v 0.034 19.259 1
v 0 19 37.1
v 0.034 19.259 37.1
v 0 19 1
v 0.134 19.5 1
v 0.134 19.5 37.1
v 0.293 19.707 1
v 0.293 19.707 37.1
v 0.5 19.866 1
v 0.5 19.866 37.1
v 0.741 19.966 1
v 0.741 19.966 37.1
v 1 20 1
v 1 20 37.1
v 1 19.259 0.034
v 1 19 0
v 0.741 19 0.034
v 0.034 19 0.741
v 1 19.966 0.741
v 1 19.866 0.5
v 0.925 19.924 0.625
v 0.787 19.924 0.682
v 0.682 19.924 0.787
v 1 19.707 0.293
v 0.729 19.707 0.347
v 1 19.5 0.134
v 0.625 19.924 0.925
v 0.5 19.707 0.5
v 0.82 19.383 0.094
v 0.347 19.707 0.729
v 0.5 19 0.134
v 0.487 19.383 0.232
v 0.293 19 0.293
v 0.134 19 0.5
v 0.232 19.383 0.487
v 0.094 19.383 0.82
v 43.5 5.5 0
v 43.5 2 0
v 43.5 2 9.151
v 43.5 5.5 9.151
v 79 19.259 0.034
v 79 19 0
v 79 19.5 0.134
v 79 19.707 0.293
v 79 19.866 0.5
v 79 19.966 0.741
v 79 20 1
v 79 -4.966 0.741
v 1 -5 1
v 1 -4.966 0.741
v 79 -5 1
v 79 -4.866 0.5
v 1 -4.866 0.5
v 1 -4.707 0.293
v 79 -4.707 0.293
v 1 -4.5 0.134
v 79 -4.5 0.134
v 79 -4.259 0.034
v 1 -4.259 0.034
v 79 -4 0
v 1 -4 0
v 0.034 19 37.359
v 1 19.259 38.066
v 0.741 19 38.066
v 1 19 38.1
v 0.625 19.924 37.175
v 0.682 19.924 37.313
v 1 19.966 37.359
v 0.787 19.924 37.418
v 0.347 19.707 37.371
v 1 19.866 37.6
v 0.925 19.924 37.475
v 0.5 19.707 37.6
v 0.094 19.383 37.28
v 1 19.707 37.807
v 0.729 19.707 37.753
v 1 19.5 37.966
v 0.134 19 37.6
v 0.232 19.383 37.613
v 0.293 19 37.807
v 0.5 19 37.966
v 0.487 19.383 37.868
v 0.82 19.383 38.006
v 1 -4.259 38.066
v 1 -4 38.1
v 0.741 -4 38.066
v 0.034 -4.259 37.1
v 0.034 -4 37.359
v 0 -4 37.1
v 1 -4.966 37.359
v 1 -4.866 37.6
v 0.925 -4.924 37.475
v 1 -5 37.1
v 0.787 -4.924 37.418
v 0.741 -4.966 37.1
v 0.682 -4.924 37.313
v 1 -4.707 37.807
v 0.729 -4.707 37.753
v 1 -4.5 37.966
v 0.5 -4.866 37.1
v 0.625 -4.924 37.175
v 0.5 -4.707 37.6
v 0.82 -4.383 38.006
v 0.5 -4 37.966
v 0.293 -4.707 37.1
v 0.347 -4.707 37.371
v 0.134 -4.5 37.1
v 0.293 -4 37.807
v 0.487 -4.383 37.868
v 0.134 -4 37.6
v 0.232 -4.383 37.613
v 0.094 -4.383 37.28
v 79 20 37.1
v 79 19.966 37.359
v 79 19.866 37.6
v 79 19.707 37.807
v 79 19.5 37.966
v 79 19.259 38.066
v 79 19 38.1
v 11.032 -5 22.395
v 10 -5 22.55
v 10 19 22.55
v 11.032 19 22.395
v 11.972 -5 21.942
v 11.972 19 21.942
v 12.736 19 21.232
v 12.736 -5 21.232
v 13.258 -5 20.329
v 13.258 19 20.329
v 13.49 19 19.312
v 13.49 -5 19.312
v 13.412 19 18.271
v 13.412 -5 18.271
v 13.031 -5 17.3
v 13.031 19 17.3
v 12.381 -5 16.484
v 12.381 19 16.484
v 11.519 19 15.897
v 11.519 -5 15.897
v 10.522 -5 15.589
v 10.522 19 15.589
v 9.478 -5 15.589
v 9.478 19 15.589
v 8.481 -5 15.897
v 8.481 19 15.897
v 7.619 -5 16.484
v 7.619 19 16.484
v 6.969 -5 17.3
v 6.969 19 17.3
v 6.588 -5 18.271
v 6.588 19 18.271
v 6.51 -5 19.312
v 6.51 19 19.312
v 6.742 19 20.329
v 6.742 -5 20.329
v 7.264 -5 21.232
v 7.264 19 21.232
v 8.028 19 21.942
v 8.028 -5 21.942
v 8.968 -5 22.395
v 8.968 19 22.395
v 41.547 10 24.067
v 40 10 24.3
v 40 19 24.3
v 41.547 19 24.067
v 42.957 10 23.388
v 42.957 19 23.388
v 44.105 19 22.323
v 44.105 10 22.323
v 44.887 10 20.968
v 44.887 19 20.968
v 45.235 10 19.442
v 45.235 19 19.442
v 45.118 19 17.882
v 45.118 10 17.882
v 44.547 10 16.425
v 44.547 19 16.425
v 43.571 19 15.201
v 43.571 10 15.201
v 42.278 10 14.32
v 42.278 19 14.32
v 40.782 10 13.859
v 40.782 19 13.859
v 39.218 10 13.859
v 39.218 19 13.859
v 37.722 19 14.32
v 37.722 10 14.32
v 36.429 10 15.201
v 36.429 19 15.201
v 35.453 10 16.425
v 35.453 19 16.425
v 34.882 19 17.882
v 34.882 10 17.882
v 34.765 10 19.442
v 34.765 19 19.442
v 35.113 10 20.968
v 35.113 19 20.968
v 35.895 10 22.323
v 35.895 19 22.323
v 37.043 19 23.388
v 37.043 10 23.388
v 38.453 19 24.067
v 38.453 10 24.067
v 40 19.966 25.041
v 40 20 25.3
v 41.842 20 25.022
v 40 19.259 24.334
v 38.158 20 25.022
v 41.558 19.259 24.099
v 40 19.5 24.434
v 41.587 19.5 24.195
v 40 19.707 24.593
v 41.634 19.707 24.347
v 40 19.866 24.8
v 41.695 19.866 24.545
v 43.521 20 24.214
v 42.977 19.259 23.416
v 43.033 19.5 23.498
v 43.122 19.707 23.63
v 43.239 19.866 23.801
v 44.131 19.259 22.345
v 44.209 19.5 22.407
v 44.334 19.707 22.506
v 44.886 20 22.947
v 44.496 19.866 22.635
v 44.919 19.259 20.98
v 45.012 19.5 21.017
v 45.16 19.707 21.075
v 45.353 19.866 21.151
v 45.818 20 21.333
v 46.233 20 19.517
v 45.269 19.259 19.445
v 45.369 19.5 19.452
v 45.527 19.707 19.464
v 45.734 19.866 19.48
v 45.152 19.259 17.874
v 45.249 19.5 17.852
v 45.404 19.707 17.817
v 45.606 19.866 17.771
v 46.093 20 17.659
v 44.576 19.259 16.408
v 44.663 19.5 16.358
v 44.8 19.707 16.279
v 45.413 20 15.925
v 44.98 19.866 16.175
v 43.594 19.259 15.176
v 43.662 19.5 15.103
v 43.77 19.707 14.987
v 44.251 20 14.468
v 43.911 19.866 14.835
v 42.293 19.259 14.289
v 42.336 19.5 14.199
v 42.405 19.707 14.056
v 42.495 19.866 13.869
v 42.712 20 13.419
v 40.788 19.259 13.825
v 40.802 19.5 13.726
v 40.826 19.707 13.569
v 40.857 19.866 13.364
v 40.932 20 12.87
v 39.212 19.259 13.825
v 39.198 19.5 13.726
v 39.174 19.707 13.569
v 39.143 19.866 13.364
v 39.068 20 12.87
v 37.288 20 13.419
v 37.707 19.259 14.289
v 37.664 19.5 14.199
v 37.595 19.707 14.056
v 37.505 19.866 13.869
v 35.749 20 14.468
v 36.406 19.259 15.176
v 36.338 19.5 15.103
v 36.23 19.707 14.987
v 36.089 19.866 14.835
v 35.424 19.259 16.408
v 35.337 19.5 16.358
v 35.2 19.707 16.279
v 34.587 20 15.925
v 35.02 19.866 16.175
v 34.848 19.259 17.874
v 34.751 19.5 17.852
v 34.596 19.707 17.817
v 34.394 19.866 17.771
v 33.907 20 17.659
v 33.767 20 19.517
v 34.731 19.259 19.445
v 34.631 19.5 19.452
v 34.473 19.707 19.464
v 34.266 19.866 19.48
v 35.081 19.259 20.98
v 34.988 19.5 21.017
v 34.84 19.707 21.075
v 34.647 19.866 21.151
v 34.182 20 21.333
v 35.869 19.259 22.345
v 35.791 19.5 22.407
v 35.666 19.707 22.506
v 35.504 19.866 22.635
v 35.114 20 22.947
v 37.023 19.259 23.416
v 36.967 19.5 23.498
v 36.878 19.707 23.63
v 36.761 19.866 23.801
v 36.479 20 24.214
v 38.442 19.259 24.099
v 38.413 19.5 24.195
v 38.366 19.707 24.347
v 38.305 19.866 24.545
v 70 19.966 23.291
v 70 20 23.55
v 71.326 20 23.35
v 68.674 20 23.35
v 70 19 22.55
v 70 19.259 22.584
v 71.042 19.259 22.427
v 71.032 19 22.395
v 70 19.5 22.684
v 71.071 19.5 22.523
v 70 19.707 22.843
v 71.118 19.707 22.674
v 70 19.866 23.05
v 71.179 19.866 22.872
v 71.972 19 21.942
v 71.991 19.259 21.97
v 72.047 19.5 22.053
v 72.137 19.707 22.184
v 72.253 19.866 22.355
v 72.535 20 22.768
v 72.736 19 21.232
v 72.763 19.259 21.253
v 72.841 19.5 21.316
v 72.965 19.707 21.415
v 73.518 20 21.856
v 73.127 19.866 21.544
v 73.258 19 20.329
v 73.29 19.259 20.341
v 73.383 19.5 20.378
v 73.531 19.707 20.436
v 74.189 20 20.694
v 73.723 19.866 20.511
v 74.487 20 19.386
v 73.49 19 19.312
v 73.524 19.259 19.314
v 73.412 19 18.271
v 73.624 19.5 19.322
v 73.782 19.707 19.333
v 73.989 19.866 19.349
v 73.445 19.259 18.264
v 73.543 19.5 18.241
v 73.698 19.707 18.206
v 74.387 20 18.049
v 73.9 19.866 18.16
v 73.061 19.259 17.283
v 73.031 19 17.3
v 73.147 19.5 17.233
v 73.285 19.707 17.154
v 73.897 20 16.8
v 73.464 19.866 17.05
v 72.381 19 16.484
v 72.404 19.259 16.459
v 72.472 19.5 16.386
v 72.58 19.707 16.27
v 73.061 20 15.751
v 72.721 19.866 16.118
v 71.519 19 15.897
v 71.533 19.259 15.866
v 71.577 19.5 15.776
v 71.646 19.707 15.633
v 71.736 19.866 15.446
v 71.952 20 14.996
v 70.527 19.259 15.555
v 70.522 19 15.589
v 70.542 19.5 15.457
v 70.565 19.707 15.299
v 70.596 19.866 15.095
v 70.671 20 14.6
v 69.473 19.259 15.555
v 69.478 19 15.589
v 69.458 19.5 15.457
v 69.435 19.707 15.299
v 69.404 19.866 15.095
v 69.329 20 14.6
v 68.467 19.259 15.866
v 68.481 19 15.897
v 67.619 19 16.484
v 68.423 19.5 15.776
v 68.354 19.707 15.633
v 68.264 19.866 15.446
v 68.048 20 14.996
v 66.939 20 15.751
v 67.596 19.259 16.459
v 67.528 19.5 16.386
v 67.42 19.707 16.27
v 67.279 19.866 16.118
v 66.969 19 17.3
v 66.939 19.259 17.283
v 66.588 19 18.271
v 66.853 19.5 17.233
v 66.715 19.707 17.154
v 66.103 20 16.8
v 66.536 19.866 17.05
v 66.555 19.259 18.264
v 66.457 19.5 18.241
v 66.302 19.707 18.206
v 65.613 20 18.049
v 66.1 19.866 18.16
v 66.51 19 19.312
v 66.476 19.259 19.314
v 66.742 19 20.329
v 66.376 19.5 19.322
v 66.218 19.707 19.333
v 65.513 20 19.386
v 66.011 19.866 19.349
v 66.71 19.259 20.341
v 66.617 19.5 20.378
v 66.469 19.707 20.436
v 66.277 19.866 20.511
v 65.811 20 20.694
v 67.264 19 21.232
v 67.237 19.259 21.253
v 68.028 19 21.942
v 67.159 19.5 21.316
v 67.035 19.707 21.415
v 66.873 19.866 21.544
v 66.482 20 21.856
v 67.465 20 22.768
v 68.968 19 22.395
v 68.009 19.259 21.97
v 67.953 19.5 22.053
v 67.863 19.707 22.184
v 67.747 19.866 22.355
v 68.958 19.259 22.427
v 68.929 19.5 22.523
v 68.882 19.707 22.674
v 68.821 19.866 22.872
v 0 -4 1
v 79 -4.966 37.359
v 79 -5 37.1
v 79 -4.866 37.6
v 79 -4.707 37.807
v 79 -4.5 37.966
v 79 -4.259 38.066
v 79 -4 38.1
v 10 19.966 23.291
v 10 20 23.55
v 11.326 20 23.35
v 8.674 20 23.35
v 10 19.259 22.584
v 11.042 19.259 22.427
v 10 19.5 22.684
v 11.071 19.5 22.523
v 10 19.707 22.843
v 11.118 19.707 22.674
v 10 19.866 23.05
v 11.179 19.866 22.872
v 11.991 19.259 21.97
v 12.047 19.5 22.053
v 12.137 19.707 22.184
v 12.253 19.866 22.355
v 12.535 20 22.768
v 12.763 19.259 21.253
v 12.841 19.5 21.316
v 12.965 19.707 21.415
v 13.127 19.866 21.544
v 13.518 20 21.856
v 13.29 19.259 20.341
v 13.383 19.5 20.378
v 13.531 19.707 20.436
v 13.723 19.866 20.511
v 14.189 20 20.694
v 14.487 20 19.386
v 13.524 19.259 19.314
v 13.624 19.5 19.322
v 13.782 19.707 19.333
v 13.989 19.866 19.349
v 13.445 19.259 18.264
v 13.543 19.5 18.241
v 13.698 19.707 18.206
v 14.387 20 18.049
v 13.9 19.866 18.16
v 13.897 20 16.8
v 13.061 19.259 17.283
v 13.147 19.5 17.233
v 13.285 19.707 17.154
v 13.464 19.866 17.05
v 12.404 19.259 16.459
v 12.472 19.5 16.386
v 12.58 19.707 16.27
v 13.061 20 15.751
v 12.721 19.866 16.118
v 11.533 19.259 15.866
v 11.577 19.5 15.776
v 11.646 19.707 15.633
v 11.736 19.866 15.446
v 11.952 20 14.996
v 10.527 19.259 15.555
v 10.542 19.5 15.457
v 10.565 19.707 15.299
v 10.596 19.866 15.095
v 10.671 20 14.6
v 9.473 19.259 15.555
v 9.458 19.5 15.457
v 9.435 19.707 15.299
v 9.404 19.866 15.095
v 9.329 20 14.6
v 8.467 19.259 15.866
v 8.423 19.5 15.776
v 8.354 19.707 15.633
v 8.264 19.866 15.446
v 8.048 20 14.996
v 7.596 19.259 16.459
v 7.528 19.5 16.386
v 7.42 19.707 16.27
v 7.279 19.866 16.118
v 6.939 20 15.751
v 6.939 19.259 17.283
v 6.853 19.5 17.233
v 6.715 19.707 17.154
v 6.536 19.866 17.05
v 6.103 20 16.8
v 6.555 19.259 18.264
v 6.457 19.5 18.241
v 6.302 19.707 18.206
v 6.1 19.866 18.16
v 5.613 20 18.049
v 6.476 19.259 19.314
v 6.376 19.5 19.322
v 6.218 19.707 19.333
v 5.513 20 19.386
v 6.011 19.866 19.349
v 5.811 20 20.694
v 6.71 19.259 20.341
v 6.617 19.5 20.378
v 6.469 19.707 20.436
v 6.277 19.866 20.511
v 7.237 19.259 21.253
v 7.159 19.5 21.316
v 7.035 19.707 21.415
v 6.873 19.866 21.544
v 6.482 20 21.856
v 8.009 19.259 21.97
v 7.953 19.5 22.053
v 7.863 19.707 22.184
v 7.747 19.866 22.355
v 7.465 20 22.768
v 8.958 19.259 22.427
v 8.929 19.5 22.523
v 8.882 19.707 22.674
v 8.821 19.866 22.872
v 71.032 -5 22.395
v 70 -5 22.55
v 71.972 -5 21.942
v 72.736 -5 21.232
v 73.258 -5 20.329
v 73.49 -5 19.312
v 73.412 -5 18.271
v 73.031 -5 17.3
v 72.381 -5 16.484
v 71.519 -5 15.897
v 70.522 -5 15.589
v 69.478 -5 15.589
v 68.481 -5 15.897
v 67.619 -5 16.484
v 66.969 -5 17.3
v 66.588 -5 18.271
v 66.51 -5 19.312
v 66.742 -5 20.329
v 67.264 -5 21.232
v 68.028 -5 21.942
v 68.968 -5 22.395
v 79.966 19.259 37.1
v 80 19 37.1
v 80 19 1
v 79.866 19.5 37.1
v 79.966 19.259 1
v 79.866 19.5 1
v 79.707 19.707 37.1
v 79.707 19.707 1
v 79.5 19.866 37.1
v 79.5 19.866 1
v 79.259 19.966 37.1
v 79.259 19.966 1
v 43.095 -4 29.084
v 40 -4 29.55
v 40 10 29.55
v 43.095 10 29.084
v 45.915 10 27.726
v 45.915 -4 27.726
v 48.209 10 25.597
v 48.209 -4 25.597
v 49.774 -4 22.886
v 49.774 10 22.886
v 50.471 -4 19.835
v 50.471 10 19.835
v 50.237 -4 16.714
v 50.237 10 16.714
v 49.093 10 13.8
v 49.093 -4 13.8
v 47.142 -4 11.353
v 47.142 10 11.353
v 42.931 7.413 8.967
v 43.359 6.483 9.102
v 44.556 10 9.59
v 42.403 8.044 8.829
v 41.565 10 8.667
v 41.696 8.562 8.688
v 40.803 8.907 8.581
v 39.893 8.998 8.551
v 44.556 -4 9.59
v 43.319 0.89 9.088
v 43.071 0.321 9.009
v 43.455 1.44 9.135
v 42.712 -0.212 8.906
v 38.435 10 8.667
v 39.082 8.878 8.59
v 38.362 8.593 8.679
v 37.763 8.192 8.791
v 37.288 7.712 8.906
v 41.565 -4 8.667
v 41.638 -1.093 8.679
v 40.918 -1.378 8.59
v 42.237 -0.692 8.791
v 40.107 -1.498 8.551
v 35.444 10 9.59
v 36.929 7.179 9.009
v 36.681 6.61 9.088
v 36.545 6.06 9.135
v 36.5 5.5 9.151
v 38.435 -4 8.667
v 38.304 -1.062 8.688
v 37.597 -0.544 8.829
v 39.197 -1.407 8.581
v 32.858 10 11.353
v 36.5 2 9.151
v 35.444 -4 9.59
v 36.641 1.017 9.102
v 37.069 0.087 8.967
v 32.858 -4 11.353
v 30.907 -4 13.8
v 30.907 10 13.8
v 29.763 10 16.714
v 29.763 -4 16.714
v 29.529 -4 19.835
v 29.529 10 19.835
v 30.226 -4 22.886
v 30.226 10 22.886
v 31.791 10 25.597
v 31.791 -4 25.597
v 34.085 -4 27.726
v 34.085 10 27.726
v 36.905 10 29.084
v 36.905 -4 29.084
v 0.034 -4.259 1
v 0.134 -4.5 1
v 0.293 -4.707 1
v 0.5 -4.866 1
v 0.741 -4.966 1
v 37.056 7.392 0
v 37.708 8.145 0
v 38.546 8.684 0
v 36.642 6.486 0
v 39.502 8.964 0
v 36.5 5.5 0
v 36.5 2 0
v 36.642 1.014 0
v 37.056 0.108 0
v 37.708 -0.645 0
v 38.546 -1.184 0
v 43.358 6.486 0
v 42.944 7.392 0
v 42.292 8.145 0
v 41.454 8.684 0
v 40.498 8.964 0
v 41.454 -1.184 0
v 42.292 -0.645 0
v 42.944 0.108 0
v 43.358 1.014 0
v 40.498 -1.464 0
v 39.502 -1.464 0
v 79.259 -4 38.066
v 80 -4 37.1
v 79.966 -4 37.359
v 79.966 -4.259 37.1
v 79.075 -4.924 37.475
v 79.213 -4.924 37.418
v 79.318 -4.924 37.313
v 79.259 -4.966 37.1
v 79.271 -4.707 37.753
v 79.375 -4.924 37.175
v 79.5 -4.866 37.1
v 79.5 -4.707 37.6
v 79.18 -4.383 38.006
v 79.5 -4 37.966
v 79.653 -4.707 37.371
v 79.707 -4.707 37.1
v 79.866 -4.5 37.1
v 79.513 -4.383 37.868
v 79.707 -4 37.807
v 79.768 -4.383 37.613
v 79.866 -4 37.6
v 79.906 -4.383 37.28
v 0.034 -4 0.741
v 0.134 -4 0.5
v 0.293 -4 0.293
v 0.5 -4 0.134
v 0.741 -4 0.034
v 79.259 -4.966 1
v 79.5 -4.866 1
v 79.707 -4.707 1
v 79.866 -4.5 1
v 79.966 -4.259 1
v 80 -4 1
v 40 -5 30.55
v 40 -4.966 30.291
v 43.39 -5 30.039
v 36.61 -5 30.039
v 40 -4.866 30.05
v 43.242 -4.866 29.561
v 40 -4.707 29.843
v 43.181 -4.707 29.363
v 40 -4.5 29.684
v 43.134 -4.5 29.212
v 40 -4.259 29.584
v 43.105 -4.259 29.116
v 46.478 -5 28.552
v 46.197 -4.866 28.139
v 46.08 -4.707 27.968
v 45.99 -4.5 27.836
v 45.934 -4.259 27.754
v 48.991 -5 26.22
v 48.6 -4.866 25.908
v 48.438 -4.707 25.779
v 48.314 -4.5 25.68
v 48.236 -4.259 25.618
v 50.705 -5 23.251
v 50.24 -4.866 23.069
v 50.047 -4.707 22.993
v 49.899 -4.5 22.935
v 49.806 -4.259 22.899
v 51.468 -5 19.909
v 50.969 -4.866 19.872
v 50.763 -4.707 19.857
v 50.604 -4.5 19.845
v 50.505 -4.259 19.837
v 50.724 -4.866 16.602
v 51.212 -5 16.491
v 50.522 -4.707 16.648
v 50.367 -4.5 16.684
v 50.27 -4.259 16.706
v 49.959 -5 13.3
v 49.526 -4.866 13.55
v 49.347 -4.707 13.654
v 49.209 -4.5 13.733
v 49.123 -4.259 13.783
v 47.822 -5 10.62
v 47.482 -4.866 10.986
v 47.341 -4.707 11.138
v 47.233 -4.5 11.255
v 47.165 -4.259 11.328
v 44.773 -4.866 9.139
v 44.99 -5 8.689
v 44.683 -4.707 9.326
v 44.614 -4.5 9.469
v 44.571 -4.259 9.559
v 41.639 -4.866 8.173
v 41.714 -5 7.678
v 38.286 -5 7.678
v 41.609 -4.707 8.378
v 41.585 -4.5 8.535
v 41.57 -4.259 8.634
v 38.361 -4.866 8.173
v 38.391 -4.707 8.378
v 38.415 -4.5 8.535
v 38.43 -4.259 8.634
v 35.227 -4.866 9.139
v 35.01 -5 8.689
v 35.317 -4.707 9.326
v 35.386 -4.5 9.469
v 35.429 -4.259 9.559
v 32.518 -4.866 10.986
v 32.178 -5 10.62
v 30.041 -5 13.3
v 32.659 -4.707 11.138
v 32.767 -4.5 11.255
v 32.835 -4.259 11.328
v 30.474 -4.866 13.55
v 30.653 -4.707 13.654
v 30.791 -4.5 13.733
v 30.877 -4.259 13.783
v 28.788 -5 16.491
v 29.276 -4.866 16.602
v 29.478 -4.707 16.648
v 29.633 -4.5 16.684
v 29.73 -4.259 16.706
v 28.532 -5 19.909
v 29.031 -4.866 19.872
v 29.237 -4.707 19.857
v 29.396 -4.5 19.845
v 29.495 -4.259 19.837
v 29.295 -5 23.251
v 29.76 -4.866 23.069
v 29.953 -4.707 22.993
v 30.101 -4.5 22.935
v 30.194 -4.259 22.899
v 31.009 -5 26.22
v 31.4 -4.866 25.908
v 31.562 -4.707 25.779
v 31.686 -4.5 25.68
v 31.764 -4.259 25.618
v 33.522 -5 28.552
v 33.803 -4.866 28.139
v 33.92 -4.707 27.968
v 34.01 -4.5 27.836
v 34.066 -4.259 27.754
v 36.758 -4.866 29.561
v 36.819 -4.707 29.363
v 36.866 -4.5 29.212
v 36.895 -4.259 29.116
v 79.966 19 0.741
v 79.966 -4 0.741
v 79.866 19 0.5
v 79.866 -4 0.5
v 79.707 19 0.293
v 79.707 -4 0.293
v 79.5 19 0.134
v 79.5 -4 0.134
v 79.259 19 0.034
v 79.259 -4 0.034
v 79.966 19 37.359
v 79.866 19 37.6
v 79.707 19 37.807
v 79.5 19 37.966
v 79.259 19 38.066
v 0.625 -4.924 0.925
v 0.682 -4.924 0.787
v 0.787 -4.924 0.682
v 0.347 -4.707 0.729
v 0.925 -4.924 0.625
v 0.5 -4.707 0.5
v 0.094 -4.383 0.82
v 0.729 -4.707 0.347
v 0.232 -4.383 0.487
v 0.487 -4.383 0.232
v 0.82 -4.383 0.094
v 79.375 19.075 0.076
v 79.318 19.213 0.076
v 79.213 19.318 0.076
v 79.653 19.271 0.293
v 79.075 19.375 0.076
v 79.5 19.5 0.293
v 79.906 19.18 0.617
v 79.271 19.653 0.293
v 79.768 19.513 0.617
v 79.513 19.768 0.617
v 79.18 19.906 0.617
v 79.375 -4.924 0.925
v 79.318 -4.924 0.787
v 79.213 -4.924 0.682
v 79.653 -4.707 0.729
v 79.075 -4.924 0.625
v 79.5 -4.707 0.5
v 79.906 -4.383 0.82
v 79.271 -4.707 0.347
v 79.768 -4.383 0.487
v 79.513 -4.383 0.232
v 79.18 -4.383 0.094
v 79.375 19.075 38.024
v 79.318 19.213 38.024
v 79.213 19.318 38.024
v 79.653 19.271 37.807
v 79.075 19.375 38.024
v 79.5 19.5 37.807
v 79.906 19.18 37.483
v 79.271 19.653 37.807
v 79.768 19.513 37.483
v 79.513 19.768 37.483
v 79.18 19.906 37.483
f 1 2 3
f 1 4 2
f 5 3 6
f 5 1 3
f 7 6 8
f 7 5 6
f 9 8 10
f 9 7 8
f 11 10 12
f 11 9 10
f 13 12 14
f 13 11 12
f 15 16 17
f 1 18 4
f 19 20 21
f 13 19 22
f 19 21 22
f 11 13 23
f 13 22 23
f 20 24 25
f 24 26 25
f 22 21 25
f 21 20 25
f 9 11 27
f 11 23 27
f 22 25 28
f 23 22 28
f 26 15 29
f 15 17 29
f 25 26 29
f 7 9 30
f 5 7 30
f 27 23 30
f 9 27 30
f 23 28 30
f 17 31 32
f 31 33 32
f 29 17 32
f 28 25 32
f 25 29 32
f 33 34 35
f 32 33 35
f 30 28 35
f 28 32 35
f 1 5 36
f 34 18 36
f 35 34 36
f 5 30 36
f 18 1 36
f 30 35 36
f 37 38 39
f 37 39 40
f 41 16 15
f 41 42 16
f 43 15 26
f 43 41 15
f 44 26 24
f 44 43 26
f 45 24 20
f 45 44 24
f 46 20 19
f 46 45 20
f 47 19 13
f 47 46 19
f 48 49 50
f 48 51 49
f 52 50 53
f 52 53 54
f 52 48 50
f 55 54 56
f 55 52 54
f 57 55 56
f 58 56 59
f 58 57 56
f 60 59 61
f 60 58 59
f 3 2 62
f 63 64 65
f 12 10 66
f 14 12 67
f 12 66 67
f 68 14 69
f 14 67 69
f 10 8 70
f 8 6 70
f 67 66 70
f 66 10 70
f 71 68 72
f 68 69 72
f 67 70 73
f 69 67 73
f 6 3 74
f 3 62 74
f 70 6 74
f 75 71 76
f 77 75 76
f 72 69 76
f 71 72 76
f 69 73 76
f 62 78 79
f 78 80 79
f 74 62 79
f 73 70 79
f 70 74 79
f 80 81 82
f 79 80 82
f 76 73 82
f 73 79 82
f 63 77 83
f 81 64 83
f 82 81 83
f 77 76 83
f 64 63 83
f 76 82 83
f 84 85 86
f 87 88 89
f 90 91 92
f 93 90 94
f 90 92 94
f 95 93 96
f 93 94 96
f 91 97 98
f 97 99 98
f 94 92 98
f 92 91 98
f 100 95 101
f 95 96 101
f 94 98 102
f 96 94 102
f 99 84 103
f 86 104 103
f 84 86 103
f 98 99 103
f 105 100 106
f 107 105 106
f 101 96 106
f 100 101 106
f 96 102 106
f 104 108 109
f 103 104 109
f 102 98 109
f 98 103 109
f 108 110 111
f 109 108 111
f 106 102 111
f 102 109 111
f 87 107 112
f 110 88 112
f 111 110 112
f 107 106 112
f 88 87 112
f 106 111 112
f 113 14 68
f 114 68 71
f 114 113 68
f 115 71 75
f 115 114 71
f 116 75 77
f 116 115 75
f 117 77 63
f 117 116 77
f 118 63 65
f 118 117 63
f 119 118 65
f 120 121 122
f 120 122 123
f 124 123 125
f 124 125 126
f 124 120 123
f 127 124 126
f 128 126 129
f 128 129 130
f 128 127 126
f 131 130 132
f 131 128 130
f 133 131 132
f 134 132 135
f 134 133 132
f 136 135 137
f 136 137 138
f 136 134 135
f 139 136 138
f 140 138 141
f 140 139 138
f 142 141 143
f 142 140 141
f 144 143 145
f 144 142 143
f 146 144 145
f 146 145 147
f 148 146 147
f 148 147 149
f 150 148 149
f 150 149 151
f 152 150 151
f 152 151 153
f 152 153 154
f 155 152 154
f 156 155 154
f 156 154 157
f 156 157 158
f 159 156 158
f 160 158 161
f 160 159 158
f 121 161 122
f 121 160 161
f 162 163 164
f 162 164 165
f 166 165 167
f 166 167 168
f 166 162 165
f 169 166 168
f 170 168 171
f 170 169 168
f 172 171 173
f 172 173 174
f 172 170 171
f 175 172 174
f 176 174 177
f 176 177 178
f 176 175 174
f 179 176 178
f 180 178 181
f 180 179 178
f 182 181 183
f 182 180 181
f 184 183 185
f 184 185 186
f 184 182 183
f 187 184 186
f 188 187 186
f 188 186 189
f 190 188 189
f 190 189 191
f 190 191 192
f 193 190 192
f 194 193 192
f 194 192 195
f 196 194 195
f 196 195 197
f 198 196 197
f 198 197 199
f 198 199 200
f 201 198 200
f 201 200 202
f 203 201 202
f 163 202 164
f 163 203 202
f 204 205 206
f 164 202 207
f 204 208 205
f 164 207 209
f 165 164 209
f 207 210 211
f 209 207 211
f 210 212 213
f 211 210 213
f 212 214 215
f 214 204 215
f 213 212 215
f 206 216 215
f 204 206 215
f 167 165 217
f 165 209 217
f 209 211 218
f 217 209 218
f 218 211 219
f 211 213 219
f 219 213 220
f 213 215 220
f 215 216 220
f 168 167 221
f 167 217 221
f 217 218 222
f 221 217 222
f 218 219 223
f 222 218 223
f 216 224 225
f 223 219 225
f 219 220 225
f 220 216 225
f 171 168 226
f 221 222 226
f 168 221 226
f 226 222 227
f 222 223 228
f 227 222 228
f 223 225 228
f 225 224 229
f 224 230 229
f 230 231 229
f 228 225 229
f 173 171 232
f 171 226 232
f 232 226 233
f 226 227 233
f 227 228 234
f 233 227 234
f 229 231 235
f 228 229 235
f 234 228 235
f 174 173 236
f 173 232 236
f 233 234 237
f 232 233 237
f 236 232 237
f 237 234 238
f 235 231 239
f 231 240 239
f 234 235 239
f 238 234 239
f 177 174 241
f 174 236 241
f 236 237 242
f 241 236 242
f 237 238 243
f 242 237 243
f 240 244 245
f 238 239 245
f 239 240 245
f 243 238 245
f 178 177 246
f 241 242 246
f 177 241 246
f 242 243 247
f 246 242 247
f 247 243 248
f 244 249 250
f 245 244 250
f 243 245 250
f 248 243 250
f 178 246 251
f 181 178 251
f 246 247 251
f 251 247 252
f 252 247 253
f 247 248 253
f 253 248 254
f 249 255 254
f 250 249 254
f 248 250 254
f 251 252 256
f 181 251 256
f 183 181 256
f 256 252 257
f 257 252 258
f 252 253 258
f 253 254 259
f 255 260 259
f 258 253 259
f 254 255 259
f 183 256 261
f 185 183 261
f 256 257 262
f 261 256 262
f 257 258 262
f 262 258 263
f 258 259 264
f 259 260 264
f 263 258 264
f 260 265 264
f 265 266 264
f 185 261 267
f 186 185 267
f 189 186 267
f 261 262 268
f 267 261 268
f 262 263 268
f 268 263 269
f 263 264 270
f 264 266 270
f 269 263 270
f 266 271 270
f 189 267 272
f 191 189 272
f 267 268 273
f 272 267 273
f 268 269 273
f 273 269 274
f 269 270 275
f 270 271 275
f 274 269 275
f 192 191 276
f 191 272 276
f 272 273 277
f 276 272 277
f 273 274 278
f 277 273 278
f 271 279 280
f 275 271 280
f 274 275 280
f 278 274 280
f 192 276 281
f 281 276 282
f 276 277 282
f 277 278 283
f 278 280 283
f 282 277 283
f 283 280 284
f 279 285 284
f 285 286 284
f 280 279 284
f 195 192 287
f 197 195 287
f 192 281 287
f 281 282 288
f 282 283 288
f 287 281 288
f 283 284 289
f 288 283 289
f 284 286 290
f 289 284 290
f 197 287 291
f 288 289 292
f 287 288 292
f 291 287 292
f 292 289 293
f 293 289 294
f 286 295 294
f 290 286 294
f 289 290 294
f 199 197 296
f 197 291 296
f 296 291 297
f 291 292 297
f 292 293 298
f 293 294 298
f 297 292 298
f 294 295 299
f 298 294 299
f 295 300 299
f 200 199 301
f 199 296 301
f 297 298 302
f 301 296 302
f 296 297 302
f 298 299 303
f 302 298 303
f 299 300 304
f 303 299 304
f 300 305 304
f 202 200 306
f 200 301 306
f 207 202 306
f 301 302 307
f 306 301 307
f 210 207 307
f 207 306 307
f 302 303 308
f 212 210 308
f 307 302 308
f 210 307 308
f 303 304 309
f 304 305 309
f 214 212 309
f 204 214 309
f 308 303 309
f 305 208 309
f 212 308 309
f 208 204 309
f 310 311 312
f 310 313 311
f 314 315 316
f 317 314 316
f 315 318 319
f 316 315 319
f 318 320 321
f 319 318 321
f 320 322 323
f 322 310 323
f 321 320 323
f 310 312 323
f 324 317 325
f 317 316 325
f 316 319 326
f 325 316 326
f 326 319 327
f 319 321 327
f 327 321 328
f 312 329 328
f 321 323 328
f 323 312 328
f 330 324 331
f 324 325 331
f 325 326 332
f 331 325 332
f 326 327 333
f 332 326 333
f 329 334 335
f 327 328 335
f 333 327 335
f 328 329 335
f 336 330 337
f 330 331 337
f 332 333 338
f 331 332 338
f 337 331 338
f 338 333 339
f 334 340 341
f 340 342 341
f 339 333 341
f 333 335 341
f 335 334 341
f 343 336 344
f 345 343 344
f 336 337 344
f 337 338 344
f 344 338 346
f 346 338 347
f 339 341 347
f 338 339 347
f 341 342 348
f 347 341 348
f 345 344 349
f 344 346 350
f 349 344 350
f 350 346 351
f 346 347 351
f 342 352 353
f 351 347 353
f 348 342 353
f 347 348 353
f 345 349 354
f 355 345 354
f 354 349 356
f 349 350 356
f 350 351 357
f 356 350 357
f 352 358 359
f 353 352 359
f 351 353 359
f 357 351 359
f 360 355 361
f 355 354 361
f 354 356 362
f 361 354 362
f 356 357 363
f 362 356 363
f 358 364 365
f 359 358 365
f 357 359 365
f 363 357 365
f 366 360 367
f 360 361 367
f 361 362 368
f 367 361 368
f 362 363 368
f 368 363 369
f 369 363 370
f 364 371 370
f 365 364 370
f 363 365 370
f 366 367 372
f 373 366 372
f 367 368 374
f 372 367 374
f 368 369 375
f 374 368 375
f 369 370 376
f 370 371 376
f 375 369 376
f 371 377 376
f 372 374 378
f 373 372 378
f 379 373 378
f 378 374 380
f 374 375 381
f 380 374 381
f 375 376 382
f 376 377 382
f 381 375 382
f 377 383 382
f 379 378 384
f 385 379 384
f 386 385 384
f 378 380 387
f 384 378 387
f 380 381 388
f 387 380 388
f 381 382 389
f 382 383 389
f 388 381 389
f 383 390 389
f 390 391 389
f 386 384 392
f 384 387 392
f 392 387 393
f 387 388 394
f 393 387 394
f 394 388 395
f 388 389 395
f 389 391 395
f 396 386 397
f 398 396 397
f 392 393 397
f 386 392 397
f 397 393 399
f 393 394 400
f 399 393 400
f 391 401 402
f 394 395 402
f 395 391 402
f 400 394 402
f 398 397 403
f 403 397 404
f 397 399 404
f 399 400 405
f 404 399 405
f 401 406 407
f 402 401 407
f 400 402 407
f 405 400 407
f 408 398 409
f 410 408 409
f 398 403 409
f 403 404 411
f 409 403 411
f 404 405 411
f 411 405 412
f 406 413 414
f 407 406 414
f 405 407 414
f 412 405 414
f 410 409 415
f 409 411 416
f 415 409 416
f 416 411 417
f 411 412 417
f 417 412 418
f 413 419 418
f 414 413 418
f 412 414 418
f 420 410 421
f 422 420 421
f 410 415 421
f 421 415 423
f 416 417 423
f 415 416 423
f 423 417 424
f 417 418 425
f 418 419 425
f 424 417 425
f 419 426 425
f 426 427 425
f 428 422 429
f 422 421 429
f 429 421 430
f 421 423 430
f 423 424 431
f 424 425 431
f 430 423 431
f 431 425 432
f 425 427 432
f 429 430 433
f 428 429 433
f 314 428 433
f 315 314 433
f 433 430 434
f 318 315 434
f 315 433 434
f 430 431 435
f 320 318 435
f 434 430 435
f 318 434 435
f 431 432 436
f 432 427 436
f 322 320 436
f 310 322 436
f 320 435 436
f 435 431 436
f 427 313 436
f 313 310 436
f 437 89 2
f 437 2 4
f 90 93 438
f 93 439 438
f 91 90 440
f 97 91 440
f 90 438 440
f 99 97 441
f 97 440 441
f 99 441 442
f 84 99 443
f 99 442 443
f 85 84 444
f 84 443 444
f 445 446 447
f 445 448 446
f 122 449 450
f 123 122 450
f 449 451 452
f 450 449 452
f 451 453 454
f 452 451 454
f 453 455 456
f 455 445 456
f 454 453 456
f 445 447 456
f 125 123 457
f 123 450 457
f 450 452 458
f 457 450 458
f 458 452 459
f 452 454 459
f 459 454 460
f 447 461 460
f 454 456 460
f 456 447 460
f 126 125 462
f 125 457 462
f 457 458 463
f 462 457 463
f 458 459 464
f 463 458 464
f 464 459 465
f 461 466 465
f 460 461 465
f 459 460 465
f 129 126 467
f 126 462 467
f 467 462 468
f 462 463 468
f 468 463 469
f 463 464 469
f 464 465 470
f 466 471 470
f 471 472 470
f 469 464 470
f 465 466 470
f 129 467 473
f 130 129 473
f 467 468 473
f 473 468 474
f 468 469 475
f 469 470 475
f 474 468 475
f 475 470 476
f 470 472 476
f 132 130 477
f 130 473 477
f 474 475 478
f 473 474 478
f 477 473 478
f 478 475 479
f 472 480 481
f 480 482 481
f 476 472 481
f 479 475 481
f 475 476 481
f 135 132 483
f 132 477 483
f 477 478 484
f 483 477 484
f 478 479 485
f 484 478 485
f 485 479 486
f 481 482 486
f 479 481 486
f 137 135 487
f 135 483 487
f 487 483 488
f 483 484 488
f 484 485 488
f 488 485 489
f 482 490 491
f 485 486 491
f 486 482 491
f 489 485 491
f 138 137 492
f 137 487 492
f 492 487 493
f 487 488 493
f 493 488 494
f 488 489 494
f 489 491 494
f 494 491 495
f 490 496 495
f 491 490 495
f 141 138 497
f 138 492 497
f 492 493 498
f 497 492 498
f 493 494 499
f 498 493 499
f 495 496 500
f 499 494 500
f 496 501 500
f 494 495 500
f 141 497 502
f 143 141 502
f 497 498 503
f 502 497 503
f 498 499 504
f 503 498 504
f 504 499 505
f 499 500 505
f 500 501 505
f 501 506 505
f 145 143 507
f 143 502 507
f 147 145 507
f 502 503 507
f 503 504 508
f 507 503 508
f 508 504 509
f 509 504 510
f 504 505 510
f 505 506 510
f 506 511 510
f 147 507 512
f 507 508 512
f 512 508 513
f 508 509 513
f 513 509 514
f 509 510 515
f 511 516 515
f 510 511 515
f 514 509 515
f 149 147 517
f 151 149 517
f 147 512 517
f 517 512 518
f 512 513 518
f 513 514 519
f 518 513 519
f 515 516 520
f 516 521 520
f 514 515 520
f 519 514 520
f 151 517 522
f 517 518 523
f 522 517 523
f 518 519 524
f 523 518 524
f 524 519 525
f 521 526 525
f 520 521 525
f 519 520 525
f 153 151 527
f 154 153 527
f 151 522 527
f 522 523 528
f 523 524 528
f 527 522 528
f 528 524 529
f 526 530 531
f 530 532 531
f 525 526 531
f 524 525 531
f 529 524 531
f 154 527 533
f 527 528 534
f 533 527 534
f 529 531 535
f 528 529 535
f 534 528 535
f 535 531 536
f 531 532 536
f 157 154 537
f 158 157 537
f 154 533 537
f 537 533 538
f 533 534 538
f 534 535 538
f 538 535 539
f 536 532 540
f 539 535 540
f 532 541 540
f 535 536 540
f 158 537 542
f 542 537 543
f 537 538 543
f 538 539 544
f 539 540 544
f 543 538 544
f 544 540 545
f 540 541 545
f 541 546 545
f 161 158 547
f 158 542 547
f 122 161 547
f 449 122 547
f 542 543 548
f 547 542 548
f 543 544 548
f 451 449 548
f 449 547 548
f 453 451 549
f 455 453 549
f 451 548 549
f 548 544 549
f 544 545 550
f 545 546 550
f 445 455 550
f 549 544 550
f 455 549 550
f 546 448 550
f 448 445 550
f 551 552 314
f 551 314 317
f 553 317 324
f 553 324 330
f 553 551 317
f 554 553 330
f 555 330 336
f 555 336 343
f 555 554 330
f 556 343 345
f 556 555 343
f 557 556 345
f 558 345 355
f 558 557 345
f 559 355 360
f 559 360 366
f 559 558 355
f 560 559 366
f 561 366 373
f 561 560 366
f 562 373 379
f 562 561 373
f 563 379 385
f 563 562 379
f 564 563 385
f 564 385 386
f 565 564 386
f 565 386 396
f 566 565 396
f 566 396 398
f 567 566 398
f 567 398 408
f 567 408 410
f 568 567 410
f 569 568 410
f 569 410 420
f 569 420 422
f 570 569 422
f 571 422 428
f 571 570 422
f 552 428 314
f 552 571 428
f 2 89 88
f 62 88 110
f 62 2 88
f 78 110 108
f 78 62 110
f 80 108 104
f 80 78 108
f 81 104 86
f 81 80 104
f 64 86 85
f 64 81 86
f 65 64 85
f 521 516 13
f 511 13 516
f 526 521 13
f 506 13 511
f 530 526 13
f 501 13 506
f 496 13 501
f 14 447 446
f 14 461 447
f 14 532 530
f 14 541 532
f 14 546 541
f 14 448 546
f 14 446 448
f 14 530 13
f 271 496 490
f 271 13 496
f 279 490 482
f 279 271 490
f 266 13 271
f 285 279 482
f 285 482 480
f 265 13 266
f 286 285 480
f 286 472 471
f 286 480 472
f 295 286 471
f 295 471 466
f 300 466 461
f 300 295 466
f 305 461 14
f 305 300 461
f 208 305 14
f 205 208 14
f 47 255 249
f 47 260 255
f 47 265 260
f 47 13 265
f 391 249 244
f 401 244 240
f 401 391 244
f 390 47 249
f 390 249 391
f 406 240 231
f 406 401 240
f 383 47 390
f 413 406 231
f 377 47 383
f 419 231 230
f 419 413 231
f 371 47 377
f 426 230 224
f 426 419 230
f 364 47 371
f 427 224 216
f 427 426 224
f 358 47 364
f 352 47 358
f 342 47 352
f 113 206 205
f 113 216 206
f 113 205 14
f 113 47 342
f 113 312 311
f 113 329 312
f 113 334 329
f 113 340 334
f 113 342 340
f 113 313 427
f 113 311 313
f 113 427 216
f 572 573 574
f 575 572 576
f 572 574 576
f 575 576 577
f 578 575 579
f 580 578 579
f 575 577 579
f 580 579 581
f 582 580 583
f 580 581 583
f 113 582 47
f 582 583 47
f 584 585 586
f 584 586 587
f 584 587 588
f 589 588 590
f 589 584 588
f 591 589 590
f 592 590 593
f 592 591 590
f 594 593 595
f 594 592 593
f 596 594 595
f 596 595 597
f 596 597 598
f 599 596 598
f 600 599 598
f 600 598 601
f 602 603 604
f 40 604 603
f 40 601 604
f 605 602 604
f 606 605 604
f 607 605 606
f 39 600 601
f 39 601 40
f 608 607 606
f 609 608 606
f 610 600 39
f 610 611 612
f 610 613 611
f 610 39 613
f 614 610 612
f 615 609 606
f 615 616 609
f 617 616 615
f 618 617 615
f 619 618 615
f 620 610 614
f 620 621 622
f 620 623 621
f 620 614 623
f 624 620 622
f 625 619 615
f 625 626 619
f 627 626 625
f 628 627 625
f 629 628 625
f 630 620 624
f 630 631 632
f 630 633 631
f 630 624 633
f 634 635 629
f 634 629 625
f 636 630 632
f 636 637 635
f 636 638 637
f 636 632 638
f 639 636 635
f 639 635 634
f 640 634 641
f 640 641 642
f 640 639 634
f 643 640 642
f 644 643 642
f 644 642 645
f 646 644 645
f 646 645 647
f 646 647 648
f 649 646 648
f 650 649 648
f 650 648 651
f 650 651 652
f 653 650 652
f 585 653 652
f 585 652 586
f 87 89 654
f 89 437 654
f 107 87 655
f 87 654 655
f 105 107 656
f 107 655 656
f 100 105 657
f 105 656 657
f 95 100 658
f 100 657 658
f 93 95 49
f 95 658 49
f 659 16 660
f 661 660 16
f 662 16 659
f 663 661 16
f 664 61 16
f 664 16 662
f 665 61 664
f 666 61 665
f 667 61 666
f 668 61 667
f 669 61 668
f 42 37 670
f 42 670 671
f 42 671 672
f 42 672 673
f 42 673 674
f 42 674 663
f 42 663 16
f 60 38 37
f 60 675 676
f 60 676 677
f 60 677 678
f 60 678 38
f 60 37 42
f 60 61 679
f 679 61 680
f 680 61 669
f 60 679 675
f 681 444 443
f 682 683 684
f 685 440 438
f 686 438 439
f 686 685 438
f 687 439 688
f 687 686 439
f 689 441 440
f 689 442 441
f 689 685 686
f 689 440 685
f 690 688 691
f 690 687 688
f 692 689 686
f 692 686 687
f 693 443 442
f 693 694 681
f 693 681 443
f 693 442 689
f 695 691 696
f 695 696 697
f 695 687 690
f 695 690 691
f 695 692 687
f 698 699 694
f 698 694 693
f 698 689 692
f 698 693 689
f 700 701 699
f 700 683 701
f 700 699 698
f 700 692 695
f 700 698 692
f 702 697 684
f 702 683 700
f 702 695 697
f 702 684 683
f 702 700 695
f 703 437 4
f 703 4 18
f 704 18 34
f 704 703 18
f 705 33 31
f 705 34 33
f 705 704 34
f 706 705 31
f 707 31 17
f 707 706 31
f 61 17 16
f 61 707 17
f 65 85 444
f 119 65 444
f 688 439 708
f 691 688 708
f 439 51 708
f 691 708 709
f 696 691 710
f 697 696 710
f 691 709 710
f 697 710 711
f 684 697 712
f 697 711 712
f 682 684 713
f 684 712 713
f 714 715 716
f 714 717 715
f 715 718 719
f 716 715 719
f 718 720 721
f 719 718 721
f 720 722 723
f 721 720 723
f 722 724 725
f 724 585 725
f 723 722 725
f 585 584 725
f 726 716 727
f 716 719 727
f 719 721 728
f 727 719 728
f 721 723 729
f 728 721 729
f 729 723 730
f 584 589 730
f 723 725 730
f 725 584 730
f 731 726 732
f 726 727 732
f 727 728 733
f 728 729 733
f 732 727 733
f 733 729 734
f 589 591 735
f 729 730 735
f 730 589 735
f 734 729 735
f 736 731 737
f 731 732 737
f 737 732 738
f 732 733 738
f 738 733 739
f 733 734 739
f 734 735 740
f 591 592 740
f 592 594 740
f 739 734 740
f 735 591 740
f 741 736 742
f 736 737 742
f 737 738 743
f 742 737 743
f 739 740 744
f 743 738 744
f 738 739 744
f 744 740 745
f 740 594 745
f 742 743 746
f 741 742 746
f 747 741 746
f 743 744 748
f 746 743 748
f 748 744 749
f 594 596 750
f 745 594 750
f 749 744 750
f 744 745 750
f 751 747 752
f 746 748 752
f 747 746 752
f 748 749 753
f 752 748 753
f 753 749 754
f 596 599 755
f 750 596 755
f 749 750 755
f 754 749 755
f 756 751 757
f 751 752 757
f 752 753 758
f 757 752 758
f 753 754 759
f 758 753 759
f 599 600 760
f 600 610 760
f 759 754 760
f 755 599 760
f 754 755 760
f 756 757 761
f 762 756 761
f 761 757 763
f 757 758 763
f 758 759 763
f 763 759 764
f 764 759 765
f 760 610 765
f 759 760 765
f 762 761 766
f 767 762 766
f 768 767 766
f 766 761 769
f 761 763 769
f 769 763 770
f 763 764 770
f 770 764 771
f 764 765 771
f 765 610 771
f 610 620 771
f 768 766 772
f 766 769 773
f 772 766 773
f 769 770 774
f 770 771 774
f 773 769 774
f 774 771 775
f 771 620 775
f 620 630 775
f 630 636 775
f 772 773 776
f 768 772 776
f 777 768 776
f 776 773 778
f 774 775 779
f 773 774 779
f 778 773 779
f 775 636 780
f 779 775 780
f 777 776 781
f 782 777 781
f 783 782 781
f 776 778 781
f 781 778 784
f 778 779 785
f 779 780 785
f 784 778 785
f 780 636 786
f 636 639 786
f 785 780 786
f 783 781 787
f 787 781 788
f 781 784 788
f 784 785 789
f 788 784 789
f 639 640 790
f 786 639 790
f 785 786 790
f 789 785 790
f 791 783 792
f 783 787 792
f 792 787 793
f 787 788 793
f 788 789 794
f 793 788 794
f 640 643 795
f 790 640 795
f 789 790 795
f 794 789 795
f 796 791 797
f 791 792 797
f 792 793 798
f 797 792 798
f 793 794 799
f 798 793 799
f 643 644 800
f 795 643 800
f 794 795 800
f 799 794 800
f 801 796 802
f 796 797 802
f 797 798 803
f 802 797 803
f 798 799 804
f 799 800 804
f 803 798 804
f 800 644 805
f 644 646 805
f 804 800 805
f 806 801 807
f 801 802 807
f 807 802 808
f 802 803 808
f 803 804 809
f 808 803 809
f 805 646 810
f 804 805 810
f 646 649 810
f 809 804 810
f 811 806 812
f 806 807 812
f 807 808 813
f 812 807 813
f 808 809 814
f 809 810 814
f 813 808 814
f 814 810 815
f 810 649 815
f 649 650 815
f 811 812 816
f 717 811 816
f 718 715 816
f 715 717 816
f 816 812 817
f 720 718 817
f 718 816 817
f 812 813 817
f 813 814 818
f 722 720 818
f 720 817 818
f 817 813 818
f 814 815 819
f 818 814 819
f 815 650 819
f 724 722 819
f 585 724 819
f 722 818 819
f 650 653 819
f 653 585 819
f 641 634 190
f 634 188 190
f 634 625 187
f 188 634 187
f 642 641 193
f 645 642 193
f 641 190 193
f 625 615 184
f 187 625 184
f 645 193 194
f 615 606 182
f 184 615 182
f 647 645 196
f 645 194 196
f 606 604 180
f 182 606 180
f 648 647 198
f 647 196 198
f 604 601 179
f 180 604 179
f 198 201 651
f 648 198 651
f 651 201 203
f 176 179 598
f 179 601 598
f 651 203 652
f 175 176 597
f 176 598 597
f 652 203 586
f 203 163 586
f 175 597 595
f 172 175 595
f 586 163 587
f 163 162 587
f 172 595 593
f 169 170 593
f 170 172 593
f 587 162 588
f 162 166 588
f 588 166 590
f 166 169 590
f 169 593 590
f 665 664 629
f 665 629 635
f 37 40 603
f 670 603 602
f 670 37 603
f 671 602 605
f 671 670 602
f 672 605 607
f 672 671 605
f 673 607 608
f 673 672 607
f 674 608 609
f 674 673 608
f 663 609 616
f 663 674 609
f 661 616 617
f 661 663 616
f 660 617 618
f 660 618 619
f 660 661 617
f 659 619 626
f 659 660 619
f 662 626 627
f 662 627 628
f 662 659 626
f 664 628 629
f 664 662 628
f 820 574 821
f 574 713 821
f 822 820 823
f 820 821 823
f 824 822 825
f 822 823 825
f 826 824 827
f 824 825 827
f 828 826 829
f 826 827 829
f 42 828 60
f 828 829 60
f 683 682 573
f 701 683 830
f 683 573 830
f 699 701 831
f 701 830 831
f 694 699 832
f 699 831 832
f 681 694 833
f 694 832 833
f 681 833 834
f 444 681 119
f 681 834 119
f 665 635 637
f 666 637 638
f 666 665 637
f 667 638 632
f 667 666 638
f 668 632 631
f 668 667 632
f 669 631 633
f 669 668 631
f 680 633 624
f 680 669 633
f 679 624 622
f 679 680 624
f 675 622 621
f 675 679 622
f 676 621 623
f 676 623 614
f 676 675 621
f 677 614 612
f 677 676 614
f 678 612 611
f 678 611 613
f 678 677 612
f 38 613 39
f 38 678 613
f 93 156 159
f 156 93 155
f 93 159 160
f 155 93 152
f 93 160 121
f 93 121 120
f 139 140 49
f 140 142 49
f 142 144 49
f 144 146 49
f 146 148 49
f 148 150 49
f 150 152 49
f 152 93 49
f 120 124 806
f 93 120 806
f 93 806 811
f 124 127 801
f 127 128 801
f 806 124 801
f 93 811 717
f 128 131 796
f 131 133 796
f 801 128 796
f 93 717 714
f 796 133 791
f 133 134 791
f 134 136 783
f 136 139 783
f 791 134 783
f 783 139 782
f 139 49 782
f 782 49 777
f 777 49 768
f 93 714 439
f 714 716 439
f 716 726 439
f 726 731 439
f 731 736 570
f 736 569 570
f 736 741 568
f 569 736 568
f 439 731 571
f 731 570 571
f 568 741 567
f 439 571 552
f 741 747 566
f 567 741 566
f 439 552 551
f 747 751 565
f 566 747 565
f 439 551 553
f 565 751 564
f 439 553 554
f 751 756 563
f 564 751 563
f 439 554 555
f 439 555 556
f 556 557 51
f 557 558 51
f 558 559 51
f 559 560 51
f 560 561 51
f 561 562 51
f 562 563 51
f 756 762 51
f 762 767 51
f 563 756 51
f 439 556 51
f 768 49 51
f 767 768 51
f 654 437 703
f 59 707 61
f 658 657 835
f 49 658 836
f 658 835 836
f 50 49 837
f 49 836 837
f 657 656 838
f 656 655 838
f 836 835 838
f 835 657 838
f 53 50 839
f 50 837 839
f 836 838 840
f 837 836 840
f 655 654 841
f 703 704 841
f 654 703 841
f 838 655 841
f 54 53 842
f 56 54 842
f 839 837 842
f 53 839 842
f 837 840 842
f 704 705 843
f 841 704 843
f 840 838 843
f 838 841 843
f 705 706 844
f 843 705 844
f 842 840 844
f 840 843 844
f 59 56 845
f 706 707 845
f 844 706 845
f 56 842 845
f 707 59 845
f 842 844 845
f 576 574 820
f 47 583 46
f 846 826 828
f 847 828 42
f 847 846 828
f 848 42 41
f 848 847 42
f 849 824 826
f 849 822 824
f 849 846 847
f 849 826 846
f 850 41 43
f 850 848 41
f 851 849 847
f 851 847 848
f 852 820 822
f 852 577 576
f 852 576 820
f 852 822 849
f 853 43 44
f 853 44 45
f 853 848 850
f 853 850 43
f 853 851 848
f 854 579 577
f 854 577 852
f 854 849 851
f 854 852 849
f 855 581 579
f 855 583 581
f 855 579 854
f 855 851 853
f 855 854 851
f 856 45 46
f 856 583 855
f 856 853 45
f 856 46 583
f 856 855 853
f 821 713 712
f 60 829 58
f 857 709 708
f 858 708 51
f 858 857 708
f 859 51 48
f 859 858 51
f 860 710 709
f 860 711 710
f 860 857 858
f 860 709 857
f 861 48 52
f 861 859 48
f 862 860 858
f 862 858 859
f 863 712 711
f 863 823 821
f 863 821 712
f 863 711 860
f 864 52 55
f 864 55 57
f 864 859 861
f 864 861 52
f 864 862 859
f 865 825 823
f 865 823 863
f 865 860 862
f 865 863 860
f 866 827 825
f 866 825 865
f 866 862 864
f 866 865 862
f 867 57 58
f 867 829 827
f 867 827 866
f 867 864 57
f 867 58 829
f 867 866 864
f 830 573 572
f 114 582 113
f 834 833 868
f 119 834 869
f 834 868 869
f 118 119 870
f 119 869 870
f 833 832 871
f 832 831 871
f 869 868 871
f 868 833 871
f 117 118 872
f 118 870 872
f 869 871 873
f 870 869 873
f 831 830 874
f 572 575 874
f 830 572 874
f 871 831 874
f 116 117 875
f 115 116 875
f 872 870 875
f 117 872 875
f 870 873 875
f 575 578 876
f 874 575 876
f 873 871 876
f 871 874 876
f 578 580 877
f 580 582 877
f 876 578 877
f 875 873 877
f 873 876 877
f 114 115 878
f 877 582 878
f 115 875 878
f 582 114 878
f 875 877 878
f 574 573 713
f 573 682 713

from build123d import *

# Parameters (mm, degrees)
SKETCH1_W           = 80
SKETCH1_H           = 38.1
SKETCH1_R           = 5
SKETCH1_R_2         = 10.5
SKETCH1_R_3         = 3.5
BOSS_EXTRUDE1_DEPTH = 20
BOSS_EXTRUDE2_START = 10
SKETCH1_4_R         = 10.5
SKETCH1_4_R_2       = 5.25
BOSS_EXTRUDE2_DEPTH = 10
BOSS_EXTRUDE4_START = -5
SKETCH1_6_W         = 80
SKETCH1_6_H         = 38.1
SKETCH1_6_R         = 5
SKETCH1_6_R_2       = 10.5
SKETCH1_6_R_3       = 3.5
BOSS_EXTRUDE4_DEPTH = 5
FILLET2_R           = 1
SKETCH3_R           = 3.5
CUT_EXTRUDE1_DEPTH  = 10


with BuildPart() as part:
    # Sketch1 → Boss-Extrude1 (new body)
    # profile 1 of 3: a face of its own
    with BuildSketch(Plane(origin=(0, 0, 0), x_dir=(1, 0, 0), z_dir=(0, 1, 0))):
        with Locations((40, -19.05)):
            Rectangle(SKETCH1_W, SKETCH1_H)
        with Locations((70, -19.05)):
            Circle(SKETCH1_R, mode=Mode.SUBTRACT)
        with Locations((10, -19.05)):
            Circle(SKETCH1_R, mode=Mode.SUBTRACT)
        with Locations(Location((40, -19.05, 0), (0, 0, 270))):
            Circle(SKETCH1_R_2, mode=Mode.SUBTRACT)
    # profile 2 of 3: a face of its own
    with BuildSketch(Plane(origin=(0, 0, 0), x_dir=(1, 0, 0), z_dir=(0, 1, 0))):
        with Locations((10, -19.05)):
            Circle(SKETCH1_R)
        with Locations(Location((10, -19.05, 0), (0, 0, 270))):
            Circle(SKETCH1_R_3, mode=Mode.SUBTRACT)
    # profile 3 of 3: a face of its own
    with BuildSketch(Plane(origin=(0, 0, 0), x_dir=(1, 0, 0), z_dir=(0, 1, 0))):
        with Locations((70, -19.05)):
            Circle(SKETCH1_R)
        with Locations(Location((70, -19.05, 0), (0, 0, 270))):
            Circle(SKETCH1_R_3, mode=Mode.SUBTRACT)
    extrude(amount=BOSS_EXTRUDE1_DEPTH)

    # Sketch1<4> → Boss-Extrude2 (add)
    with BuildSketch(Plane(origin=(0, 0, 0), x_dir=(1, 0, 0), z_dir=(0, 1, 0)).offset(BOSS_EXTRUDE2_START)):
        with Locations(Location((40, -19.05, 0), (0, 0, 270))):
            Circle(SKETCH1_4_R)
        with Locations(Location((40, -19.05, 0), (0, 0, 270))):
            Circle(SKETCH1_4_R_2, mode=Mode.SUBTRACT)
    extrude(amount=BOSS_EXTRUDE2_DEPTH)

    # Sketch1<6> → Boss-Extrude4 (add)
    # profile 1 of 3: a face of its own
    with BuildSketch(Plane(origin=(0, 0, 0), x_dir=(1, 0, 0), z_dir=(0, 1, 0)).offset(BOSS_EXTRUDE4_START)):
        with Locations((40, -19.05)):
            Rectangle(SKETCH1_6_W, SKETCH1_6_H)
        with Locations((70, -19.05)):
            Circle(SKETCH1_6_R, mode=Mode.SUBTRACT)
        with Locations((10, -19.05)):
            Circle(SKETCH1_6_R, mode=Mode.SUBTRACT)
        with Locations(Location((40, -19.05, 0), (0, 0, 270))):
            Circle(SKETCH1_6_R_2, mode=Mode.SUBTRACT)
    # profile 2 of 3: a face of its own
    with BuildSketch(Plane(origin=(0, 0, 0), x_dir=(1, 0, 0), z_dir=(0, 1, 0)).offset(BOSS_EXTRUDE4_START)):
        with Locations((70, -19.05)):
            Circle(SKETCH1_6_R)
        with Locations(Location((70, -19.05, 0), (0, 0, 270))):
            Circle(SKETCH1_6_R_3, mode=Mode.SUBTRACT)
    # profile 3 of 3: a face of its own
    with BuildSketch(Plane(origin=(0, 0, 0), x_dir=(1, 0, 0), z_dir=(0, 1, 0)).offset(BOSS_EXTRUDE4_START)):
        with Locations((10, -19.05)):
            Circle(SKETCH1_6_R)
        with Locations(Location((10, -19.05, 0), (0, 0, 270))):
            Circle(SKETCH1_6_R_3, mode=Mode.SUBTRACT)
    extrude(amount=BOSS_EXTRUDE4_DEPTH)

    # Fillet2
    fillet2_edges = [part.edges().sort_by_distance(p)[0] for p in [
        (80, 20, 19.05),
        (80, 7.5, 38.1),
        (0, 7.5, 38.1),
        (0, 7.5, 0),
        (80, 7.5, 0),
        (40, 20, 0),
        (0, 20, 19.05),
        (40, 20, 13.8),
        (40, 20, 38.1),
        (40, -5, 38.1),
        (0, -5, 19.05),
        (40, -5, 8.55),
        (10, 20, 15.55),
        (80, -5, 19.05),
        (40, -5, 0),
        (70, 20, 15.55),
    ]]
    fillet(fillet2_edges, radius=FILLET2_R)

    # Sketch3 → Cut-Extrude1 (cut)
    with BuildSketch(Plane.XY):
        with Locations((40, 5.5)):
            Circle(SKETCH3_R)
        with Locations((40, 2)):
            Circle(SKETCH3_R)
        with BuildLine():
            ThreePointArc((43.031088913, 3.75), (43.380740392, 2.905866658), (43.5, 2))
            Line((43.5, 2), (43.5, 5.5))
            ThreePointArc((43.5, 5.5), (43.380740392, 4.594133342), (43.031088913, 3.75))
        make_face()
        with BuildLine():
            Line((36.5, 5.5), (36.5, 2))
            ThreePointArc((36.5, 2), (36.619259608, 2.905866658), (36.968911087, 3.75))
            ThreePointArc((36.968911087, 3.75), (36.619259608, 4.594133342), (36.5, 5.5))
        make_face()
    extrude(amount=CUT_EXTRUDE1_DEPTH, mode=Mode.SUBTRACT)


solid = part.part
